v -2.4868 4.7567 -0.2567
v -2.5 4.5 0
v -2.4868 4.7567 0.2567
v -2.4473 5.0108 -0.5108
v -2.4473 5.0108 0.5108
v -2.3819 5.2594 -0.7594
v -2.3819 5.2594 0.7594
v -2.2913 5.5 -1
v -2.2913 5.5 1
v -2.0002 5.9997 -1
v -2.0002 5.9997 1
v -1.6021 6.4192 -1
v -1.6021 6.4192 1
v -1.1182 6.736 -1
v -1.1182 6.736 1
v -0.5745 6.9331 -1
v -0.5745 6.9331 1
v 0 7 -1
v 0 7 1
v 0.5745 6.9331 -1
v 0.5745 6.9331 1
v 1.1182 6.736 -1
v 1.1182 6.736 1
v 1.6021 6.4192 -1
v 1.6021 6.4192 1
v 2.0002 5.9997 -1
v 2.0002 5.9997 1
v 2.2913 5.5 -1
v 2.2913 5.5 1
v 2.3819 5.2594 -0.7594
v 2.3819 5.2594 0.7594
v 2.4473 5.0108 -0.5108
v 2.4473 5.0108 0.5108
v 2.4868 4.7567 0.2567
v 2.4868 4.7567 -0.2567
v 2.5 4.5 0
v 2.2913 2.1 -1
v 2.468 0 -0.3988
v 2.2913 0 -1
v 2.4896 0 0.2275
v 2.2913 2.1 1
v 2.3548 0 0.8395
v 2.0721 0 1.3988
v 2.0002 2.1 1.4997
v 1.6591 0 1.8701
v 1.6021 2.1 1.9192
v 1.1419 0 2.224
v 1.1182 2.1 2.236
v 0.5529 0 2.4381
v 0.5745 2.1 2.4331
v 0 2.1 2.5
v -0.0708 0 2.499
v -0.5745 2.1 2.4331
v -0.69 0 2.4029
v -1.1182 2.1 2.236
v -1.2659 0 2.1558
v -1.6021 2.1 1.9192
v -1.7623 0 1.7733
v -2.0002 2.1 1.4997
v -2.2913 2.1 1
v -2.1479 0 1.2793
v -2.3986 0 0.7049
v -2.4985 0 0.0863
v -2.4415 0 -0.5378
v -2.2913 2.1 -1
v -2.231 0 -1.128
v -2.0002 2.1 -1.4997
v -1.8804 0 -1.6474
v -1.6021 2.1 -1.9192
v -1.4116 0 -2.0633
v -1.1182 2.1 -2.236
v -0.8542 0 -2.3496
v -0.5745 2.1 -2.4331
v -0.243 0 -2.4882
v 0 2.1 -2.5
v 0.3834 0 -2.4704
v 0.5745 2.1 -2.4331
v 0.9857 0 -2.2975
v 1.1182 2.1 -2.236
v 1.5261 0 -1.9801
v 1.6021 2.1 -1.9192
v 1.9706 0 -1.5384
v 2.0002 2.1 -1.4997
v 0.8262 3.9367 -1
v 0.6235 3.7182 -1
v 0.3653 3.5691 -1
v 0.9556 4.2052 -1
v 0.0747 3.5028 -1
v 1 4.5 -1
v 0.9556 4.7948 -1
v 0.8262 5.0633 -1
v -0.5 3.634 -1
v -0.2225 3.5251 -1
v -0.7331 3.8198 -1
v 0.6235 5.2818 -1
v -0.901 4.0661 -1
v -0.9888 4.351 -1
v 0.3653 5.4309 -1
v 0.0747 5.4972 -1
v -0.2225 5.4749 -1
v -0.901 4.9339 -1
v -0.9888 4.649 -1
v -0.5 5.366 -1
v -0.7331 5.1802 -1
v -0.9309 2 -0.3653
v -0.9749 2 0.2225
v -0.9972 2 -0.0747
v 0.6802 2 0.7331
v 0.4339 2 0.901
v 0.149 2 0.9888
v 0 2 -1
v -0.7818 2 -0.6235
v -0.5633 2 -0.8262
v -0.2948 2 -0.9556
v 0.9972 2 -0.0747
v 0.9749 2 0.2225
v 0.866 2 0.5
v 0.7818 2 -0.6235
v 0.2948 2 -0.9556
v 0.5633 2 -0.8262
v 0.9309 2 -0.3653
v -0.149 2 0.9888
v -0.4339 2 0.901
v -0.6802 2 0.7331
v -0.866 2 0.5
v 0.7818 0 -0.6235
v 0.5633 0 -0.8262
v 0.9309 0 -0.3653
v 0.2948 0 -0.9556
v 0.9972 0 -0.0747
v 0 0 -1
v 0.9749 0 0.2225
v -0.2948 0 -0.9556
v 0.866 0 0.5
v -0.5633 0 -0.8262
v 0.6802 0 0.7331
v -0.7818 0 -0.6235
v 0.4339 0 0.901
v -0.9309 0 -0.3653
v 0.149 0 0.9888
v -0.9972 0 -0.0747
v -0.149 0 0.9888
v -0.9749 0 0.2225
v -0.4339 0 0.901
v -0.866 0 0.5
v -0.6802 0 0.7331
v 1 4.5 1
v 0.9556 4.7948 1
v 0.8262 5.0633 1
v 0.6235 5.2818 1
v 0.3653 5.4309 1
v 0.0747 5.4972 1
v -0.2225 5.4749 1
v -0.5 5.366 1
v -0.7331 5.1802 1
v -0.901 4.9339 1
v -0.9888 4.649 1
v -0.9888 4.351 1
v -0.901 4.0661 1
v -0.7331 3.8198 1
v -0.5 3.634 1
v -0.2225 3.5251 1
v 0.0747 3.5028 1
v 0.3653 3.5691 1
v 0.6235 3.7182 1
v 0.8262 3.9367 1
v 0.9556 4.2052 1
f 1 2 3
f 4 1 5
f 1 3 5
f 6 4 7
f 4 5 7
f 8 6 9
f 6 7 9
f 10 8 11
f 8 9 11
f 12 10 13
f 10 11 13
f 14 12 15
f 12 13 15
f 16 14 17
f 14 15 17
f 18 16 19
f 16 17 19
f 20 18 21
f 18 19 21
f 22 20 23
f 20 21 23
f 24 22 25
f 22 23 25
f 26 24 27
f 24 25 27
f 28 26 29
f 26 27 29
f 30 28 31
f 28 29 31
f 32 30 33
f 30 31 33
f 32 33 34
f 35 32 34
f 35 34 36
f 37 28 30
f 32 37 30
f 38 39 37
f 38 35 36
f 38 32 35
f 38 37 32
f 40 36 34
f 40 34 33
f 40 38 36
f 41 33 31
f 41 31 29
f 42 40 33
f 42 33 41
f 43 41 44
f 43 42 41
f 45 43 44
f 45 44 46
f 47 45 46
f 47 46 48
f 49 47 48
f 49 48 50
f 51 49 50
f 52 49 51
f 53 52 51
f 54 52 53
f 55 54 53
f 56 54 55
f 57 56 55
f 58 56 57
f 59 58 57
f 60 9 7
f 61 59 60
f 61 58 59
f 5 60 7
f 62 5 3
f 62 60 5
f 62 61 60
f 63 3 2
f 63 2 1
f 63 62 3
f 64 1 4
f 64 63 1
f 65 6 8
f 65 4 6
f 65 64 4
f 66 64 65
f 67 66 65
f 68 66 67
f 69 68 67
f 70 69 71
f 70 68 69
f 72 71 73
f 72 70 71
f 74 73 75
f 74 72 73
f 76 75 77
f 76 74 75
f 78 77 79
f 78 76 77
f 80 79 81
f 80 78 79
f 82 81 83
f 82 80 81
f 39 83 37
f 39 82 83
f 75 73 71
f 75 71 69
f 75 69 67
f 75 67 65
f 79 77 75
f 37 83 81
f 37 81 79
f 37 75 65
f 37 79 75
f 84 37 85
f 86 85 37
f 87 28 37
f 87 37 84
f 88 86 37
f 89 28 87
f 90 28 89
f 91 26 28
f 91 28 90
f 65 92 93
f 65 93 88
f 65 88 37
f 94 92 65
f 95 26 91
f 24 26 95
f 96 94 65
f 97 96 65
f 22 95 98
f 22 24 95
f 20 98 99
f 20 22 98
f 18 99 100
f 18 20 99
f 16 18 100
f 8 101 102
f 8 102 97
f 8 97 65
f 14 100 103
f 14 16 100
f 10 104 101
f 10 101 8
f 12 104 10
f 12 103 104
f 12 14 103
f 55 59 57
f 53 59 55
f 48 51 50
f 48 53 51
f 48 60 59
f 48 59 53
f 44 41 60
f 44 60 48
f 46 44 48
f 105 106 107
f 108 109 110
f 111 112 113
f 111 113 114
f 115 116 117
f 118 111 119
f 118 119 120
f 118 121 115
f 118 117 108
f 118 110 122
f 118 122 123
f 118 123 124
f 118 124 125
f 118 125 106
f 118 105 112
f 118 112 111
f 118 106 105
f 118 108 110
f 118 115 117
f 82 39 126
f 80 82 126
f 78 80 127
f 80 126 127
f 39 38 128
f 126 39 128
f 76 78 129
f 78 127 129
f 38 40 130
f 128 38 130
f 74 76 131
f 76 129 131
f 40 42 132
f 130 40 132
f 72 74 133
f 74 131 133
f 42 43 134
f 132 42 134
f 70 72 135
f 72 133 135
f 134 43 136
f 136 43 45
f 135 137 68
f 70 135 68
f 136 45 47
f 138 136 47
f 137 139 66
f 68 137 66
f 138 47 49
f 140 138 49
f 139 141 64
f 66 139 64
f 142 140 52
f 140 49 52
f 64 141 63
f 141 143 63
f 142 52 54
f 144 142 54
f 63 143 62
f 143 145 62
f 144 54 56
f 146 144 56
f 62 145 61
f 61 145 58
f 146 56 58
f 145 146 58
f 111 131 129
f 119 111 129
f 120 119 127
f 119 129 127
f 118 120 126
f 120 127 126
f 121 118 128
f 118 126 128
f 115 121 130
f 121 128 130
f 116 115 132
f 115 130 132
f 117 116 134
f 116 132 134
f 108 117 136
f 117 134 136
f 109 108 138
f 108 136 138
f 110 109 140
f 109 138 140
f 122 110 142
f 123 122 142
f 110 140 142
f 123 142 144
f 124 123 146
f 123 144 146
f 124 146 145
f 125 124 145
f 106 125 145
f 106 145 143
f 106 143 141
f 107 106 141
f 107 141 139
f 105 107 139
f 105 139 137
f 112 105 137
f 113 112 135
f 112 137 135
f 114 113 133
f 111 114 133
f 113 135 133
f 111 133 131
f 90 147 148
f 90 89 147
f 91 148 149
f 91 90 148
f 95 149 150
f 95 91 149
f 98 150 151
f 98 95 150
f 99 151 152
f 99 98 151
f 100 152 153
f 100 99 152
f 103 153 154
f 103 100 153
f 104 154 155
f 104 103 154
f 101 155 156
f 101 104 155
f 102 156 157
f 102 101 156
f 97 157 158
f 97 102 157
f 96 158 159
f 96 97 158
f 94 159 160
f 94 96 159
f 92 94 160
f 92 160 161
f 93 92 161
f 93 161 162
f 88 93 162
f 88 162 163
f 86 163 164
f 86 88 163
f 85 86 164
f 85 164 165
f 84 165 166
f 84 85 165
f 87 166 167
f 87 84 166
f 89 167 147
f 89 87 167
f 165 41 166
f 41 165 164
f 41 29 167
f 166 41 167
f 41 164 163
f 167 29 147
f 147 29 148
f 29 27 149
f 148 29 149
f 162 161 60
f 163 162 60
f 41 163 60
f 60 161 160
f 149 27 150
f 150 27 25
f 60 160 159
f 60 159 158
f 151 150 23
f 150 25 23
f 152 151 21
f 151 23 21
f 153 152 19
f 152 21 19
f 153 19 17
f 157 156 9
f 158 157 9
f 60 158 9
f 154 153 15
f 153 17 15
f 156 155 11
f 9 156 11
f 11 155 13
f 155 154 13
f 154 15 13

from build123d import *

# Parameters (mm, degrees)
SKETCH1_R           = 2.5
SKETCH1_R_2         = 1
BOSS_EXTRUDE2_DEPTH = 2.1
SKETCH2_R           = 1
BOSS_EXTRUDE3_DEPTH = 1
SKETCH4_R           = 1
CUT_EXTRUDE13_DEPTH = 2
SKETCH6_OUTSIDE_W   = 8.99
SKETCH6_OUTSIDE_H   = 8.99
SKETCH6_OUTSIDE_R   = 2.5
CUT_EXTRUDE14_DEPTH = 8.842193571


with BuildPart() as part:
    # Sketch1 → Boss-Extrude2 (new body)
    with BuildSketch(Plane(origin=(0, 0, 0), x_dir=(1, 0, 0), z_dir=(0, 1, 0))):
        with Locations(Location((0, 0, 0), (0, 0, 270))):
            Circle(SKETCH1_R)
        with Locations(Location((0, 0, 0), (0, 0, 270))):
            Circle(SKETCH1_R_2, mode=Mode.SUBTRACT)
    extrude(amount=BOSS_EXTRUDE2_DEPTH)

    # Sketch2 → Boss-Extrude3 (add, symmetric)
    with BuildSketch(Plane.XY):
        with BuildLine():
            Line((2.5, 4.5), (2.5, 0))
            Line((2.5, 0), (-2.5, 0))
            Line((-2.5, 0), (-2.5, 4.5))
            ThreePointArc((-2.5, 4.5), (0, 7), (2.5, 4.5))
        make_face()
        with Locations((0, 4.5)):
            Circle(SKETCH2_R, mode=Mode.SUBTRACT)
    extrude(amount=BOSS_EXTRUDE3_DEPTH, both=True)

    # Sketch4 → Cut-Extrude13 (cut)
    with BuildSketch(Plane.XZ):
        with Locations(Location((0, 0, 0), (0, 0, 270))):
            Circle(SKETCH4_R)
    extrude(amount=-CUT_EXTRUDE13_DEPTH, mode=Mode.SUBTRACT)

    # Sketch6 outside → Cut-Extrude14 (cut, through all)
    with BuildSketch(Plane.XZ):
        Rectangle(SKETCH6_OUTSIDE_W, SKETCH6_OUTSIDE_H)
        with Locations(Location((0, 0, 0), (0, 0, 336.421821522))):
            Circle(SKETCH6_OUTSIDE_R, mode=Mode.SUBTRACT)
    extrude(amount=-CUT_EXTRUDE14_DEPTH, mode=Mode.SUBTRACT)


solid = part.part
